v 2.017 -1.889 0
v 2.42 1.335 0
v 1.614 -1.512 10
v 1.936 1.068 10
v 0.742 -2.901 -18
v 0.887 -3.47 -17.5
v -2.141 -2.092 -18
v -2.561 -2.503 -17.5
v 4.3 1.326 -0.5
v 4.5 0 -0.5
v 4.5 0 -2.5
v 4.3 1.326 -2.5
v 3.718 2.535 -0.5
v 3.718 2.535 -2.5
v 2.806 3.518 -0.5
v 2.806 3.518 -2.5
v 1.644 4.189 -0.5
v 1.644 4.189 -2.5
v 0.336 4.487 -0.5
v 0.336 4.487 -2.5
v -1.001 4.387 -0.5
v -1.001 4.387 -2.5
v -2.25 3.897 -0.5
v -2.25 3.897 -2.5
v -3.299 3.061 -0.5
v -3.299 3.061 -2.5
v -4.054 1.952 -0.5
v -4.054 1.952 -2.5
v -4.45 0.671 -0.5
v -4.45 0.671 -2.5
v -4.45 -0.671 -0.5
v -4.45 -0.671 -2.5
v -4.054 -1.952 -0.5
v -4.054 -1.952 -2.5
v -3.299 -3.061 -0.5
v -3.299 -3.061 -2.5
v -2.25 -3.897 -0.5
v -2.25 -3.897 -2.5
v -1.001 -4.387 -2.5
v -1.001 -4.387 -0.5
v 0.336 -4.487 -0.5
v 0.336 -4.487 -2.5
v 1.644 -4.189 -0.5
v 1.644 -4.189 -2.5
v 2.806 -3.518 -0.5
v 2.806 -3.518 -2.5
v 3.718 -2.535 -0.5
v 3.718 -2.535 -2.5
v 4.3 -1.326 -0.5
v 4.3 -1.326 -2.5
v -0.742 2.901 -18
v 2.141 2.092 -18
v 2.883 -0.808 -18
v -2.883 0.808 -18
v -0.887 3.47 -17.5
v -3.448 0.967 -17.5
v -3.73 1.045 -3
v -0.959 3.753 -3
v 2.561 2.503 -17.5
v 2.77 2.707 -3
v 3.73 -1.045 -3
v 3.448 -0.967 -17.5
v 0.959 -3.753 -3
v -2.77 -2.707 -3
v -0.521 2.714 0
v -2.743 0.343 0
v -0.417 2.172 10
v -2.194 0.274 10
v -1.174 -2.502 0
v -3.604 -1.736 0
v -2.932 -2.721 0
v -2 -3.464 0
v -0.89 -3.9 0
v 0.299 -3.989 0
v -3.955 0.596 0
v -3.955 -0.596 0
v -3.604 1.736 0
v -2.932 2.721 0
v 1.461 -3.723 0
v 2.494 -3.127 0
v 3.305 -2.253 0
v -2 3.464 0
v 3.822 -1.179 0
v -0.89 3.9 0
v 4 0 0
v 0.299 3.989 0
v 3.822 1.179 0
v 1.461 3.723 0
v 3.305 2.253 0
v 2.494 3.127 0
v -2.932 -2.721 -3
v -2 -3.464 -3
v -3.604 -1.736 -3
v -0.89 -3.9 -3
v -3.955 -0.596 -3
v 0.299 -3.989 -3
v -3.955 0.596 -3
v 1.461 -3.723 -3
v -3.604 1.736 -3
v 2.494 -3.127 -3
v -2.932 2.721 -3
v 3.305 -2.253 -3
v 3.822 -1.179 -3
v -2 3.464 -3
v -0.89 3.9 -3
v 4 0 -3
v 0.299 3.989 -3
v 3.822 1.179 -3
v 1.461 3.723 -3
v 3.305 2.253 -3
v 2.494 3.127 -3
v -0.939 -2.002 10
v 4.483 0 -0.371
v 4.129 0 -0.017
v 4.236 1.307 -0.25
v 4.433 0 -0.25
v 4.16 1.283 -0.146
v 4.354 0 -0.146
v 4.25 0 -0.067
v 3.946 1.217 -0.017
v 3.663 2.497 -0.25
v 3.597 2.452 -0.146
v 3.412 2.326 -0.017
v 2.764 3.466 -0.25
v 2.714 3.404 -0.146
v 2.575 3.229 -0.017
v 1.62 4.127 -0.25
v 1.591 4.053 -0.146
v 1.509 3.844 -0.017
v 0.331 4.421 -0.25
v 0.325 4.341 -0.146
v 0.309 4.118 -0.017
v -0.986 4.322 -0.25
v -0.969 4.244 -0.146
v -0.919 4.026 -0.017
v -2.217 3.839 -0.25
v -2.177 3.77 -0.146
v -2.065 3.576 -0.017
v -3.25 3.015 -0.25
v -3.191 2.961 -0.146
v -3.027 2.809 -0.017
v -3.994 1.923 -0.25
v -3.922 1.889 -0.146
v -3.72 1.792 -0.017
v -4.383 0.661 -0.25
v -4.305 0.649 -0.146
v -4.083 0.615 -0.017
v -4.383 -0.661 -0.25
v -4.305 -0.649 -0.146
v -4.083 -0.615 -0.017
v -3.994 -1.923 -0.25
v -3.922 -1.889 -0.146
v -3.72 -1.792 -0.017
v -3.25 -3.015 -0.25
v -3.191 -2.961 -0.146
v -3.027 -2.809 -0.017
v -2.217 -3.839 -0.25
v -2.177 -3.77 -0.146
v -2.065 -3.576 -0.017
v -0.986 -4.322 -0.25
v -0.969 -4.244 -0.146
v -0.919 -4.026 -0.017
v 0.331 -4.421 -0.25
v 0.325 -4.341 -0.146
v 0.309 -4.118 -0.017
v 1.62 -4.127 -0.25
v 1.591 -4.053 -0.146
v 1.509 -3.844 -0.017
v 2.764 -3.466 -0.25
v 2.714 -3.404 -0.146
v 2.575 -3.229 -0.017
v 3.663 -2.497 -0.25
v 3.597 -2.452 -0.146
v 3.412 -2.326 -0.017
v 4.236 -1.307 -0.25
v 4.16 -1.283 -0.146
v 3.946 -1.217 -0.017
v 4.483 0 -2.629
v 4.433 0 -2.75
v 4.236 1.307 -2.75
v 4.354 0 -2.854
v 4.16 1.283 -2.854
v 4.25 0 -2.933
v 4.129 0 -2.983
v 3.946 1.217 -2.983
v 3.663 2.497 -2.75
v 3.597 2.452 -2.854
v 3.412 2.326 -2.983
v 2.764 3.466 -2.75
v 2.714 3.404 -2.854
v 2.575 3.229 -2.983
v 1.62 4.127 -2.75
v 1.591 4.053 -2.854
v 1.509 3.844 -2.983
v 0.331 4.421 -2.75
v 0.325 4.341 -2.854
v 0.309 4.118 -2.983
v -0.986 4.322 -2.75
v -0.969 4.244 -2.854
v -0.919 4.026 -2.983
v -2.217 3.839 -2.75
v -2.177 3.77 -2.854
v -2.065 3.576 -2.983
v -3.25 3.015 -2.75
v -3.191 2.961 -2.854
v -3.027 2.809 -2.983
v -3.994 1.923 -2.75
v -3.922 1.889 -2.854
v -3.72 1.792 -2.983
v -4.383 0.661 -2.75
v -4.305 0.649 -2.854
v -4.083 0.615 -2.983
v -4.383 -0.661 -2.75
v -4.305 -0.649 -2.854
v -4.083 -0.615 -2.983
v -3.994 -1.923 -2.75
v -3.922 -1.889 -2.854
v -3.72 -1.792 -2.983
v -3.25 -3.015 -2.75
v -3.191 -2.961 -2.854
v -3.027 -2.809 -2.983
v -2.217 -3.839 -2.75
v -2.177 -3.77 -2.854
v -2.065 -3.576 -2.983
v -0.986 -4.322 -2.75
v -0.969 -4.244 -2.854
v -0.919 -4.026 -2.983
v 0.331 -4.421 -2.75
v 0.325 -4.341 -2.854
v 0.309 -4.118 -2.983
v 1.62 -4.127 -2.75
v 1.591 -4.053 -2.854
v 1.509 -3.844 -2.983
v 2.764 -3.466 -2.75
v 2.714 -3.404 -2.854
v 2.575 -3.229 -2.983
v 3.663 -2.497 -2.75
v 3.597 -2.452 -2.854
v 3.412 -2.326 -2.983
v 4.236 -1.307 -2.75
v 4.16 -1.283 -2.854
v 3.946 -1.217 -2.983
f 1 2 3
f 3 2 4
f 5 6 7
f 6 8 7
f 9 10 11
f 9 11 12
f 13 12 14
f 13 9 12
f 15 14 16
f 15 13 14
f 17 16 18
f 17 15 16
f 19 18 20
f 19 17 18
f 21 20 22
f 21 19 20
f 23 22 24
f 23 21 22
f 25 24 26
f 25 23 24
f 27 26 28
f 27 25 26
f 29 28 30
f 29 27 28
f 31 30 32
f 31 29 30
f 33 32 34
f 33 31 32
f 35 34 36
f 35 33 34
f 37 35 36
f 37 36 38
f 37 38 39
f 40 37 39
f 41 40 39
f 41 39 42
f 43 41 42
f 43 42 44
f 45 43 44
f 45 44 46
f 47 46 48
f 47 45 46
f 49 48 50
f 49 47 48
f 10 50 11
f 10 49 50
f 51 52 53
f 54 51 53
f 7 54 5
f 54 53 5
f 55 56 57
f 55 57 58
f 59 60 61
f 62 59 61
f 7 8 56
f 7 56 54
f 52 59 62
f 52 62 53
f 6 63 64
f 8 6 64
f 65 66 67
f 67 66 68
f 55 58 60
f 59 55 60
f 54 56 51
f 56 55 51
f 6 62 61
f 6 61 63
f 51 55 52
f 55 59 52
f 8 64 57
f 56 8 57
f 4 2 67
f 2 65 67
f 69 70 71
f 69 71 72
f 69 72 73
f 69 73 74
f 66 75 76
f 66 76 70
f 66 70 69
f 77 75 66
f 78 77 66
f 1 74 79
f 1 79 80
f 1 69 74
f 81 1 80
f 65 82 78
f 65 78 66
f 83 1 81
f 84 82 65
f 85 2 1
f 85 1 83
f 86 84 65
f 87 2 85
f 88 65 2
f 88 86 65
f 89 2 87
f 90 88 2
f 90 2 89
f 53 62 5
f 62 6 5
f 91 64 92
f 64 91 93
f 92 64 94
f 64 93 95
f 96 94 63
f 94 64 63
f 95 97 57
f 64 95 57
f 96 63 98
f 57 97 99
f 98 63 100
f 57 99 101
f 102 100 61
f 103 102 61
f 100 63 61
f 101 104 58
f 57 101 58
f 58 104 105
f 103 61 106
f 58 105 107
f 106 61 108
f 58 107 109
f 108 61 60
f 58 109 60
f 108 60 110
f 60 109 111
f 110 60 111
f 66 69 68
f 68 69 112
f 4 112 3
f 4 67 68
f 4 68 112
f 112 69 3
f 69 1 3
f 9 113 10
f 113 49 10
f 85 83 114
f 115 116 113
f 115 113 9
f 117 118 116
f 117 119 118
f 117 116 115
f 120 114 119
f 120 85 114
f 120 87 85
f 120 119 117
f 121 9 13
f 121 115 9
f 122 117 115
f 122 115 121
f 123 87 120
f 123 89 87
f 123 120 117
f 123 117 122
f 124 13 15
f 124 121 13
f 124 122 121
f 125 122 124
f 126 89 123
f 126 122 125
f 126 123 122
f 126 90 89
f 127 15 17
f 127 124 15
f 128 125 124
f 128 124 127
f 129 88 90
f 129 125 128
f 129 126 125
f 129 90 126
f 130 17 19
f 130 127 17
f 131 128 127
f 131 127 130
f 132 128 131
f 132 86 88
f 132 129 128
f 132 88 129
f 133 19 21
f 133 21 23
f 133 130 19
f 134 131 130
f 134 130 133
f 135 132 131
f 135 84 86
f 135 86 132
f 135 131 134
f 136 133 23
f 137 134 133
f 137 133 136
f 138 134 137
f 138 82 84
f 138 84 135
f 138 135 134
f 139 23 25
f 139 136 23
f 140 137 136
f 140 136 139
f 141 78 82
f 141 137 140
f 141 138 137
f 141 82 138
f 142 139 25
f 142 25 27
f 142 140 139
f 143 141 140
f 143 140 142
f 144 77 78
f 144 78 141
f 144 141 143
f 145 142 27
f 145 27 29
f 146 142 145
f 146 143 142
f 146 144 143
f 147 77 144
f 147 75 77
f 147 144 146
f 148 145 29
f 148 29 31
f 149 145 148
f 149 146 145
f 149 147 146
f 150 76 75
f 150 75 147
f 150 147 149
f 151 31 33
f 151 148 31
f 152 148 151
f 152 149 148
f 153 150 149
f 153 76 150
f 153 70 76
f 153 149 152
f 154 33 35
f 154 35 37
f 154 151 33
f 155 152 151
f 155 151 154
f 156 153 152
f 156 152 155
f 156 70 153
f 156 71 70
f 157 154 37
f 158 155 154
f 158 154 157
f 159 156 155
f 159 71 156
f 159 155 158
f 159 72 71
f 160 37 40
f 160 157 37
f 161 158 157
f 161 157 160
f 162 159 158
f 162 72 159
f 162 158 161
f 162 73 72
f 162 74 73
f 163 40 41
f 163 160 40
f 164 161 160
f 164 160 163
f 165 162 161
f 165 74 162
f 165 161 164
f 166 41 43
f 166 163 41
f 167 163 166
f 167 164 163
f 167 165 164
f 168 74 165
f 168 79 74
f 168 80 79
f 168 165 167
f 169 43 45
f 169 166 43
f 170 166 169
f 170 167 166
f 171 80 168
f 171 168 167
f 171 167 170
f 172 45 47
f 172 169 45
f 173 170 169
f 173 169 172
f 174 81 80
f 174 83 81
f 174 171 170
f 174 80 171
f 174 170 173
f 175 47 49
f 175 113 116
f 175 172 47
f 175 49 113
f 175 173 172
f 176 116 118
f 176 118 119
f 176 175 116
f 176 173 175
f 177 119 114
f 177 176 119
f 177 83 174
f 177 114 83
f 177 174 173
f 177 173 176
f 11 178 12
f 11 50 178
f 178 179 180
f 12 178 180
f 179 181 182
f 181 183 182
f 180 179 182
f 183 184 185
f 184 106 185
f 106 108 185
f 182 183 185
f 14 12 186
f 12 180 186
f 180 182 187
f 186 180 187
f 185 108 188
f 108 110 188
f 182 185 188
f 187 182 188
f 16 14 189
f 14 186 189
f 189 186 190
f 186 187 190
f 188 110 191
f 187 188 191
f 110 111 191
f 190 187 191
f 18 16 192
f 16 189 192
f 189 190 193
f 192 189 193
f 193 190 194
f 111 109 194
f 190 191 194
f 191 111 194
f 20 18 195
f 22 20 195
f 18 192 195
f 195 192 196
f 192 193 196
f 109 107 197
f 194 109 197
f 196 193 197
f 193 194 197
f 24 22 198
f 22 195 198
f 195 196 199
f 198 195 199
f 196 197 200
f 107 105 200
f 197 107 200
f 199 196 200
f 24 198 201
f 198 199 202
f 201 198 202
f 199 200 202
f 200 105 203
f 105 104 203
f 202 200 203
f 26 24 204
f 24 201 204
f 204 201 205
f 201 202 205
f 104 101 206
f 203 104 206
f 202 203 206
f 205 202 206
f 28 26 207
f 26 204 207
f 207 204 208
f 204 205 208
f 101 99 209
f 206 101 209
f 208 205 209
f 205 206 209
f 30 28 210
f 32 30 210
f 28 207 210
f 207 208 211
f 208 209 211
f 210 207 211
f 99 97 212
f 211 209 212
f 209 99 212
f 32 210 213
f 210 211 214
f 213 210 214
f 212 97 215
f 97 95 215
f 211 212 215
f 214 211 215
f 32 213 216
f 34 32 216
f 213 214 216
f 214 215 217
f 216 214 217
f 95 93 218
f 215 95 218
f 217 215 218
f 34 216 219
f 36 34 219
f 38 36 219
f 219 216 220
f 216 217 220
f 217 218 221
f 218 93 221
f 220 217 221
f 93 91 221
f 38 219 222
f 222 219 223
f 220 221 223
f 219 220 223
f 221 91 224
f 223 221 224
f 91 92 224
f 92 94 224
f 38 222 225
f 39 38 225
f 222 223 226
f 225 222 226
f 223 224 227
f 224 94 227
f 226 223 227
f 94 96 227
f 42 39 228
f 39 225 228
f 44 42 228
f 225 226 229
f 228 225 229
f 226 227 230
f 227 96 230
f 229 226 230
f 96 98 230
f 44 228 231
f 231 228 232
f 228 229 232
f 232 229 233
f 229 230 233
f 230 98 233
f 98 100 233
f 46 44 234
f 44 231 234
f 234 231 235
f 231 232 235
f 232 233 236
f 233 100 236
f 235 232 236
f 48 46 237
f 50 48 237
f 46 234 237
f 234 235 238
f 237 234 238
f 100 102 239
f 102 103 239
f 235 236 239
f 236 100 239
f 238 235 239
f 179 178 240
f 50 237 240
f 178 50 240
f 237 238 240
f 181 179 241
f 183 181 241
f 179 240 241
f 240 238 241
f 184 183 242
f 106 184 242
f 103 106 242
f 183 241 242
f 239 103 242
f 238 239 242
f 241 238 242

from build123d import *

# Parameters (mm, degrees)
F1_DEPTH = 10
F1_TAPER = 2.56
F2_R     = 4.5
F3_DEPTH = 3
F4_R     = 0.5
F6_DEPTH = 15
F6_TAPER = 1
F7_SIZE  = 0.5


with BuildPart() as f1:
    # F0 (on Top) → F1 (new body)
    with BuildSketch(Plane.XY):
        Polygon((-1.173613, -2.502389), (2.017247, -1.889453), (2.42034, 1.334643), (-0.521395, 2.714308), (-2.74258, 0.342891), align=None)
    extrude(amount=F1_DEPTH, taper=F1_TAPER)

    # F2 (on Top) → F3 (join)
    with BuildSketch(Plane.XY):
        Circle(F2_R)
    extrude(amount=-F3_DEPTH)

    # F4
    f4_edges = [f1.edges().sort_by_distance(p)[0] for p in [
        (-4.5, 0, 0),
        (-4.5, 0, -3),
    ]]
    fillet(f4_edges, radius=F4_R)

    # F5 (on face) → F6 (join)
    with BuildSketch(Plane(origin=(0, 0, -3), x_dir=(1, 0, 0), z_dir=(0, 0, -1))):
        Polygon((2.770276, -2.707296), (3.729724, 1.045481), (0.959449, 3.752777), (-2.770276, 2.707296), (-3.729724, -1.045481), (-0.959449, -3.752777), align=None)
    extrude(amount=F6_DEPTH, taper=F6_TAPER)

    # F7
    f7_edges = [f1.edges().sort_by_distance(p)[0] for p in [
        (2.161589, -2.211874, -18),
        (-0.834745, -2.977927, -18),
        (-2.996333, -0.766054, -18),
        (-2.161589, 2.211874, -18),
        (0.834745, 2.977927, -18),
        (2.996333, 0.766054, -18),
    ]]
    chamfer(f7_edges, length=F7_SIZE)


solid = f1.part
